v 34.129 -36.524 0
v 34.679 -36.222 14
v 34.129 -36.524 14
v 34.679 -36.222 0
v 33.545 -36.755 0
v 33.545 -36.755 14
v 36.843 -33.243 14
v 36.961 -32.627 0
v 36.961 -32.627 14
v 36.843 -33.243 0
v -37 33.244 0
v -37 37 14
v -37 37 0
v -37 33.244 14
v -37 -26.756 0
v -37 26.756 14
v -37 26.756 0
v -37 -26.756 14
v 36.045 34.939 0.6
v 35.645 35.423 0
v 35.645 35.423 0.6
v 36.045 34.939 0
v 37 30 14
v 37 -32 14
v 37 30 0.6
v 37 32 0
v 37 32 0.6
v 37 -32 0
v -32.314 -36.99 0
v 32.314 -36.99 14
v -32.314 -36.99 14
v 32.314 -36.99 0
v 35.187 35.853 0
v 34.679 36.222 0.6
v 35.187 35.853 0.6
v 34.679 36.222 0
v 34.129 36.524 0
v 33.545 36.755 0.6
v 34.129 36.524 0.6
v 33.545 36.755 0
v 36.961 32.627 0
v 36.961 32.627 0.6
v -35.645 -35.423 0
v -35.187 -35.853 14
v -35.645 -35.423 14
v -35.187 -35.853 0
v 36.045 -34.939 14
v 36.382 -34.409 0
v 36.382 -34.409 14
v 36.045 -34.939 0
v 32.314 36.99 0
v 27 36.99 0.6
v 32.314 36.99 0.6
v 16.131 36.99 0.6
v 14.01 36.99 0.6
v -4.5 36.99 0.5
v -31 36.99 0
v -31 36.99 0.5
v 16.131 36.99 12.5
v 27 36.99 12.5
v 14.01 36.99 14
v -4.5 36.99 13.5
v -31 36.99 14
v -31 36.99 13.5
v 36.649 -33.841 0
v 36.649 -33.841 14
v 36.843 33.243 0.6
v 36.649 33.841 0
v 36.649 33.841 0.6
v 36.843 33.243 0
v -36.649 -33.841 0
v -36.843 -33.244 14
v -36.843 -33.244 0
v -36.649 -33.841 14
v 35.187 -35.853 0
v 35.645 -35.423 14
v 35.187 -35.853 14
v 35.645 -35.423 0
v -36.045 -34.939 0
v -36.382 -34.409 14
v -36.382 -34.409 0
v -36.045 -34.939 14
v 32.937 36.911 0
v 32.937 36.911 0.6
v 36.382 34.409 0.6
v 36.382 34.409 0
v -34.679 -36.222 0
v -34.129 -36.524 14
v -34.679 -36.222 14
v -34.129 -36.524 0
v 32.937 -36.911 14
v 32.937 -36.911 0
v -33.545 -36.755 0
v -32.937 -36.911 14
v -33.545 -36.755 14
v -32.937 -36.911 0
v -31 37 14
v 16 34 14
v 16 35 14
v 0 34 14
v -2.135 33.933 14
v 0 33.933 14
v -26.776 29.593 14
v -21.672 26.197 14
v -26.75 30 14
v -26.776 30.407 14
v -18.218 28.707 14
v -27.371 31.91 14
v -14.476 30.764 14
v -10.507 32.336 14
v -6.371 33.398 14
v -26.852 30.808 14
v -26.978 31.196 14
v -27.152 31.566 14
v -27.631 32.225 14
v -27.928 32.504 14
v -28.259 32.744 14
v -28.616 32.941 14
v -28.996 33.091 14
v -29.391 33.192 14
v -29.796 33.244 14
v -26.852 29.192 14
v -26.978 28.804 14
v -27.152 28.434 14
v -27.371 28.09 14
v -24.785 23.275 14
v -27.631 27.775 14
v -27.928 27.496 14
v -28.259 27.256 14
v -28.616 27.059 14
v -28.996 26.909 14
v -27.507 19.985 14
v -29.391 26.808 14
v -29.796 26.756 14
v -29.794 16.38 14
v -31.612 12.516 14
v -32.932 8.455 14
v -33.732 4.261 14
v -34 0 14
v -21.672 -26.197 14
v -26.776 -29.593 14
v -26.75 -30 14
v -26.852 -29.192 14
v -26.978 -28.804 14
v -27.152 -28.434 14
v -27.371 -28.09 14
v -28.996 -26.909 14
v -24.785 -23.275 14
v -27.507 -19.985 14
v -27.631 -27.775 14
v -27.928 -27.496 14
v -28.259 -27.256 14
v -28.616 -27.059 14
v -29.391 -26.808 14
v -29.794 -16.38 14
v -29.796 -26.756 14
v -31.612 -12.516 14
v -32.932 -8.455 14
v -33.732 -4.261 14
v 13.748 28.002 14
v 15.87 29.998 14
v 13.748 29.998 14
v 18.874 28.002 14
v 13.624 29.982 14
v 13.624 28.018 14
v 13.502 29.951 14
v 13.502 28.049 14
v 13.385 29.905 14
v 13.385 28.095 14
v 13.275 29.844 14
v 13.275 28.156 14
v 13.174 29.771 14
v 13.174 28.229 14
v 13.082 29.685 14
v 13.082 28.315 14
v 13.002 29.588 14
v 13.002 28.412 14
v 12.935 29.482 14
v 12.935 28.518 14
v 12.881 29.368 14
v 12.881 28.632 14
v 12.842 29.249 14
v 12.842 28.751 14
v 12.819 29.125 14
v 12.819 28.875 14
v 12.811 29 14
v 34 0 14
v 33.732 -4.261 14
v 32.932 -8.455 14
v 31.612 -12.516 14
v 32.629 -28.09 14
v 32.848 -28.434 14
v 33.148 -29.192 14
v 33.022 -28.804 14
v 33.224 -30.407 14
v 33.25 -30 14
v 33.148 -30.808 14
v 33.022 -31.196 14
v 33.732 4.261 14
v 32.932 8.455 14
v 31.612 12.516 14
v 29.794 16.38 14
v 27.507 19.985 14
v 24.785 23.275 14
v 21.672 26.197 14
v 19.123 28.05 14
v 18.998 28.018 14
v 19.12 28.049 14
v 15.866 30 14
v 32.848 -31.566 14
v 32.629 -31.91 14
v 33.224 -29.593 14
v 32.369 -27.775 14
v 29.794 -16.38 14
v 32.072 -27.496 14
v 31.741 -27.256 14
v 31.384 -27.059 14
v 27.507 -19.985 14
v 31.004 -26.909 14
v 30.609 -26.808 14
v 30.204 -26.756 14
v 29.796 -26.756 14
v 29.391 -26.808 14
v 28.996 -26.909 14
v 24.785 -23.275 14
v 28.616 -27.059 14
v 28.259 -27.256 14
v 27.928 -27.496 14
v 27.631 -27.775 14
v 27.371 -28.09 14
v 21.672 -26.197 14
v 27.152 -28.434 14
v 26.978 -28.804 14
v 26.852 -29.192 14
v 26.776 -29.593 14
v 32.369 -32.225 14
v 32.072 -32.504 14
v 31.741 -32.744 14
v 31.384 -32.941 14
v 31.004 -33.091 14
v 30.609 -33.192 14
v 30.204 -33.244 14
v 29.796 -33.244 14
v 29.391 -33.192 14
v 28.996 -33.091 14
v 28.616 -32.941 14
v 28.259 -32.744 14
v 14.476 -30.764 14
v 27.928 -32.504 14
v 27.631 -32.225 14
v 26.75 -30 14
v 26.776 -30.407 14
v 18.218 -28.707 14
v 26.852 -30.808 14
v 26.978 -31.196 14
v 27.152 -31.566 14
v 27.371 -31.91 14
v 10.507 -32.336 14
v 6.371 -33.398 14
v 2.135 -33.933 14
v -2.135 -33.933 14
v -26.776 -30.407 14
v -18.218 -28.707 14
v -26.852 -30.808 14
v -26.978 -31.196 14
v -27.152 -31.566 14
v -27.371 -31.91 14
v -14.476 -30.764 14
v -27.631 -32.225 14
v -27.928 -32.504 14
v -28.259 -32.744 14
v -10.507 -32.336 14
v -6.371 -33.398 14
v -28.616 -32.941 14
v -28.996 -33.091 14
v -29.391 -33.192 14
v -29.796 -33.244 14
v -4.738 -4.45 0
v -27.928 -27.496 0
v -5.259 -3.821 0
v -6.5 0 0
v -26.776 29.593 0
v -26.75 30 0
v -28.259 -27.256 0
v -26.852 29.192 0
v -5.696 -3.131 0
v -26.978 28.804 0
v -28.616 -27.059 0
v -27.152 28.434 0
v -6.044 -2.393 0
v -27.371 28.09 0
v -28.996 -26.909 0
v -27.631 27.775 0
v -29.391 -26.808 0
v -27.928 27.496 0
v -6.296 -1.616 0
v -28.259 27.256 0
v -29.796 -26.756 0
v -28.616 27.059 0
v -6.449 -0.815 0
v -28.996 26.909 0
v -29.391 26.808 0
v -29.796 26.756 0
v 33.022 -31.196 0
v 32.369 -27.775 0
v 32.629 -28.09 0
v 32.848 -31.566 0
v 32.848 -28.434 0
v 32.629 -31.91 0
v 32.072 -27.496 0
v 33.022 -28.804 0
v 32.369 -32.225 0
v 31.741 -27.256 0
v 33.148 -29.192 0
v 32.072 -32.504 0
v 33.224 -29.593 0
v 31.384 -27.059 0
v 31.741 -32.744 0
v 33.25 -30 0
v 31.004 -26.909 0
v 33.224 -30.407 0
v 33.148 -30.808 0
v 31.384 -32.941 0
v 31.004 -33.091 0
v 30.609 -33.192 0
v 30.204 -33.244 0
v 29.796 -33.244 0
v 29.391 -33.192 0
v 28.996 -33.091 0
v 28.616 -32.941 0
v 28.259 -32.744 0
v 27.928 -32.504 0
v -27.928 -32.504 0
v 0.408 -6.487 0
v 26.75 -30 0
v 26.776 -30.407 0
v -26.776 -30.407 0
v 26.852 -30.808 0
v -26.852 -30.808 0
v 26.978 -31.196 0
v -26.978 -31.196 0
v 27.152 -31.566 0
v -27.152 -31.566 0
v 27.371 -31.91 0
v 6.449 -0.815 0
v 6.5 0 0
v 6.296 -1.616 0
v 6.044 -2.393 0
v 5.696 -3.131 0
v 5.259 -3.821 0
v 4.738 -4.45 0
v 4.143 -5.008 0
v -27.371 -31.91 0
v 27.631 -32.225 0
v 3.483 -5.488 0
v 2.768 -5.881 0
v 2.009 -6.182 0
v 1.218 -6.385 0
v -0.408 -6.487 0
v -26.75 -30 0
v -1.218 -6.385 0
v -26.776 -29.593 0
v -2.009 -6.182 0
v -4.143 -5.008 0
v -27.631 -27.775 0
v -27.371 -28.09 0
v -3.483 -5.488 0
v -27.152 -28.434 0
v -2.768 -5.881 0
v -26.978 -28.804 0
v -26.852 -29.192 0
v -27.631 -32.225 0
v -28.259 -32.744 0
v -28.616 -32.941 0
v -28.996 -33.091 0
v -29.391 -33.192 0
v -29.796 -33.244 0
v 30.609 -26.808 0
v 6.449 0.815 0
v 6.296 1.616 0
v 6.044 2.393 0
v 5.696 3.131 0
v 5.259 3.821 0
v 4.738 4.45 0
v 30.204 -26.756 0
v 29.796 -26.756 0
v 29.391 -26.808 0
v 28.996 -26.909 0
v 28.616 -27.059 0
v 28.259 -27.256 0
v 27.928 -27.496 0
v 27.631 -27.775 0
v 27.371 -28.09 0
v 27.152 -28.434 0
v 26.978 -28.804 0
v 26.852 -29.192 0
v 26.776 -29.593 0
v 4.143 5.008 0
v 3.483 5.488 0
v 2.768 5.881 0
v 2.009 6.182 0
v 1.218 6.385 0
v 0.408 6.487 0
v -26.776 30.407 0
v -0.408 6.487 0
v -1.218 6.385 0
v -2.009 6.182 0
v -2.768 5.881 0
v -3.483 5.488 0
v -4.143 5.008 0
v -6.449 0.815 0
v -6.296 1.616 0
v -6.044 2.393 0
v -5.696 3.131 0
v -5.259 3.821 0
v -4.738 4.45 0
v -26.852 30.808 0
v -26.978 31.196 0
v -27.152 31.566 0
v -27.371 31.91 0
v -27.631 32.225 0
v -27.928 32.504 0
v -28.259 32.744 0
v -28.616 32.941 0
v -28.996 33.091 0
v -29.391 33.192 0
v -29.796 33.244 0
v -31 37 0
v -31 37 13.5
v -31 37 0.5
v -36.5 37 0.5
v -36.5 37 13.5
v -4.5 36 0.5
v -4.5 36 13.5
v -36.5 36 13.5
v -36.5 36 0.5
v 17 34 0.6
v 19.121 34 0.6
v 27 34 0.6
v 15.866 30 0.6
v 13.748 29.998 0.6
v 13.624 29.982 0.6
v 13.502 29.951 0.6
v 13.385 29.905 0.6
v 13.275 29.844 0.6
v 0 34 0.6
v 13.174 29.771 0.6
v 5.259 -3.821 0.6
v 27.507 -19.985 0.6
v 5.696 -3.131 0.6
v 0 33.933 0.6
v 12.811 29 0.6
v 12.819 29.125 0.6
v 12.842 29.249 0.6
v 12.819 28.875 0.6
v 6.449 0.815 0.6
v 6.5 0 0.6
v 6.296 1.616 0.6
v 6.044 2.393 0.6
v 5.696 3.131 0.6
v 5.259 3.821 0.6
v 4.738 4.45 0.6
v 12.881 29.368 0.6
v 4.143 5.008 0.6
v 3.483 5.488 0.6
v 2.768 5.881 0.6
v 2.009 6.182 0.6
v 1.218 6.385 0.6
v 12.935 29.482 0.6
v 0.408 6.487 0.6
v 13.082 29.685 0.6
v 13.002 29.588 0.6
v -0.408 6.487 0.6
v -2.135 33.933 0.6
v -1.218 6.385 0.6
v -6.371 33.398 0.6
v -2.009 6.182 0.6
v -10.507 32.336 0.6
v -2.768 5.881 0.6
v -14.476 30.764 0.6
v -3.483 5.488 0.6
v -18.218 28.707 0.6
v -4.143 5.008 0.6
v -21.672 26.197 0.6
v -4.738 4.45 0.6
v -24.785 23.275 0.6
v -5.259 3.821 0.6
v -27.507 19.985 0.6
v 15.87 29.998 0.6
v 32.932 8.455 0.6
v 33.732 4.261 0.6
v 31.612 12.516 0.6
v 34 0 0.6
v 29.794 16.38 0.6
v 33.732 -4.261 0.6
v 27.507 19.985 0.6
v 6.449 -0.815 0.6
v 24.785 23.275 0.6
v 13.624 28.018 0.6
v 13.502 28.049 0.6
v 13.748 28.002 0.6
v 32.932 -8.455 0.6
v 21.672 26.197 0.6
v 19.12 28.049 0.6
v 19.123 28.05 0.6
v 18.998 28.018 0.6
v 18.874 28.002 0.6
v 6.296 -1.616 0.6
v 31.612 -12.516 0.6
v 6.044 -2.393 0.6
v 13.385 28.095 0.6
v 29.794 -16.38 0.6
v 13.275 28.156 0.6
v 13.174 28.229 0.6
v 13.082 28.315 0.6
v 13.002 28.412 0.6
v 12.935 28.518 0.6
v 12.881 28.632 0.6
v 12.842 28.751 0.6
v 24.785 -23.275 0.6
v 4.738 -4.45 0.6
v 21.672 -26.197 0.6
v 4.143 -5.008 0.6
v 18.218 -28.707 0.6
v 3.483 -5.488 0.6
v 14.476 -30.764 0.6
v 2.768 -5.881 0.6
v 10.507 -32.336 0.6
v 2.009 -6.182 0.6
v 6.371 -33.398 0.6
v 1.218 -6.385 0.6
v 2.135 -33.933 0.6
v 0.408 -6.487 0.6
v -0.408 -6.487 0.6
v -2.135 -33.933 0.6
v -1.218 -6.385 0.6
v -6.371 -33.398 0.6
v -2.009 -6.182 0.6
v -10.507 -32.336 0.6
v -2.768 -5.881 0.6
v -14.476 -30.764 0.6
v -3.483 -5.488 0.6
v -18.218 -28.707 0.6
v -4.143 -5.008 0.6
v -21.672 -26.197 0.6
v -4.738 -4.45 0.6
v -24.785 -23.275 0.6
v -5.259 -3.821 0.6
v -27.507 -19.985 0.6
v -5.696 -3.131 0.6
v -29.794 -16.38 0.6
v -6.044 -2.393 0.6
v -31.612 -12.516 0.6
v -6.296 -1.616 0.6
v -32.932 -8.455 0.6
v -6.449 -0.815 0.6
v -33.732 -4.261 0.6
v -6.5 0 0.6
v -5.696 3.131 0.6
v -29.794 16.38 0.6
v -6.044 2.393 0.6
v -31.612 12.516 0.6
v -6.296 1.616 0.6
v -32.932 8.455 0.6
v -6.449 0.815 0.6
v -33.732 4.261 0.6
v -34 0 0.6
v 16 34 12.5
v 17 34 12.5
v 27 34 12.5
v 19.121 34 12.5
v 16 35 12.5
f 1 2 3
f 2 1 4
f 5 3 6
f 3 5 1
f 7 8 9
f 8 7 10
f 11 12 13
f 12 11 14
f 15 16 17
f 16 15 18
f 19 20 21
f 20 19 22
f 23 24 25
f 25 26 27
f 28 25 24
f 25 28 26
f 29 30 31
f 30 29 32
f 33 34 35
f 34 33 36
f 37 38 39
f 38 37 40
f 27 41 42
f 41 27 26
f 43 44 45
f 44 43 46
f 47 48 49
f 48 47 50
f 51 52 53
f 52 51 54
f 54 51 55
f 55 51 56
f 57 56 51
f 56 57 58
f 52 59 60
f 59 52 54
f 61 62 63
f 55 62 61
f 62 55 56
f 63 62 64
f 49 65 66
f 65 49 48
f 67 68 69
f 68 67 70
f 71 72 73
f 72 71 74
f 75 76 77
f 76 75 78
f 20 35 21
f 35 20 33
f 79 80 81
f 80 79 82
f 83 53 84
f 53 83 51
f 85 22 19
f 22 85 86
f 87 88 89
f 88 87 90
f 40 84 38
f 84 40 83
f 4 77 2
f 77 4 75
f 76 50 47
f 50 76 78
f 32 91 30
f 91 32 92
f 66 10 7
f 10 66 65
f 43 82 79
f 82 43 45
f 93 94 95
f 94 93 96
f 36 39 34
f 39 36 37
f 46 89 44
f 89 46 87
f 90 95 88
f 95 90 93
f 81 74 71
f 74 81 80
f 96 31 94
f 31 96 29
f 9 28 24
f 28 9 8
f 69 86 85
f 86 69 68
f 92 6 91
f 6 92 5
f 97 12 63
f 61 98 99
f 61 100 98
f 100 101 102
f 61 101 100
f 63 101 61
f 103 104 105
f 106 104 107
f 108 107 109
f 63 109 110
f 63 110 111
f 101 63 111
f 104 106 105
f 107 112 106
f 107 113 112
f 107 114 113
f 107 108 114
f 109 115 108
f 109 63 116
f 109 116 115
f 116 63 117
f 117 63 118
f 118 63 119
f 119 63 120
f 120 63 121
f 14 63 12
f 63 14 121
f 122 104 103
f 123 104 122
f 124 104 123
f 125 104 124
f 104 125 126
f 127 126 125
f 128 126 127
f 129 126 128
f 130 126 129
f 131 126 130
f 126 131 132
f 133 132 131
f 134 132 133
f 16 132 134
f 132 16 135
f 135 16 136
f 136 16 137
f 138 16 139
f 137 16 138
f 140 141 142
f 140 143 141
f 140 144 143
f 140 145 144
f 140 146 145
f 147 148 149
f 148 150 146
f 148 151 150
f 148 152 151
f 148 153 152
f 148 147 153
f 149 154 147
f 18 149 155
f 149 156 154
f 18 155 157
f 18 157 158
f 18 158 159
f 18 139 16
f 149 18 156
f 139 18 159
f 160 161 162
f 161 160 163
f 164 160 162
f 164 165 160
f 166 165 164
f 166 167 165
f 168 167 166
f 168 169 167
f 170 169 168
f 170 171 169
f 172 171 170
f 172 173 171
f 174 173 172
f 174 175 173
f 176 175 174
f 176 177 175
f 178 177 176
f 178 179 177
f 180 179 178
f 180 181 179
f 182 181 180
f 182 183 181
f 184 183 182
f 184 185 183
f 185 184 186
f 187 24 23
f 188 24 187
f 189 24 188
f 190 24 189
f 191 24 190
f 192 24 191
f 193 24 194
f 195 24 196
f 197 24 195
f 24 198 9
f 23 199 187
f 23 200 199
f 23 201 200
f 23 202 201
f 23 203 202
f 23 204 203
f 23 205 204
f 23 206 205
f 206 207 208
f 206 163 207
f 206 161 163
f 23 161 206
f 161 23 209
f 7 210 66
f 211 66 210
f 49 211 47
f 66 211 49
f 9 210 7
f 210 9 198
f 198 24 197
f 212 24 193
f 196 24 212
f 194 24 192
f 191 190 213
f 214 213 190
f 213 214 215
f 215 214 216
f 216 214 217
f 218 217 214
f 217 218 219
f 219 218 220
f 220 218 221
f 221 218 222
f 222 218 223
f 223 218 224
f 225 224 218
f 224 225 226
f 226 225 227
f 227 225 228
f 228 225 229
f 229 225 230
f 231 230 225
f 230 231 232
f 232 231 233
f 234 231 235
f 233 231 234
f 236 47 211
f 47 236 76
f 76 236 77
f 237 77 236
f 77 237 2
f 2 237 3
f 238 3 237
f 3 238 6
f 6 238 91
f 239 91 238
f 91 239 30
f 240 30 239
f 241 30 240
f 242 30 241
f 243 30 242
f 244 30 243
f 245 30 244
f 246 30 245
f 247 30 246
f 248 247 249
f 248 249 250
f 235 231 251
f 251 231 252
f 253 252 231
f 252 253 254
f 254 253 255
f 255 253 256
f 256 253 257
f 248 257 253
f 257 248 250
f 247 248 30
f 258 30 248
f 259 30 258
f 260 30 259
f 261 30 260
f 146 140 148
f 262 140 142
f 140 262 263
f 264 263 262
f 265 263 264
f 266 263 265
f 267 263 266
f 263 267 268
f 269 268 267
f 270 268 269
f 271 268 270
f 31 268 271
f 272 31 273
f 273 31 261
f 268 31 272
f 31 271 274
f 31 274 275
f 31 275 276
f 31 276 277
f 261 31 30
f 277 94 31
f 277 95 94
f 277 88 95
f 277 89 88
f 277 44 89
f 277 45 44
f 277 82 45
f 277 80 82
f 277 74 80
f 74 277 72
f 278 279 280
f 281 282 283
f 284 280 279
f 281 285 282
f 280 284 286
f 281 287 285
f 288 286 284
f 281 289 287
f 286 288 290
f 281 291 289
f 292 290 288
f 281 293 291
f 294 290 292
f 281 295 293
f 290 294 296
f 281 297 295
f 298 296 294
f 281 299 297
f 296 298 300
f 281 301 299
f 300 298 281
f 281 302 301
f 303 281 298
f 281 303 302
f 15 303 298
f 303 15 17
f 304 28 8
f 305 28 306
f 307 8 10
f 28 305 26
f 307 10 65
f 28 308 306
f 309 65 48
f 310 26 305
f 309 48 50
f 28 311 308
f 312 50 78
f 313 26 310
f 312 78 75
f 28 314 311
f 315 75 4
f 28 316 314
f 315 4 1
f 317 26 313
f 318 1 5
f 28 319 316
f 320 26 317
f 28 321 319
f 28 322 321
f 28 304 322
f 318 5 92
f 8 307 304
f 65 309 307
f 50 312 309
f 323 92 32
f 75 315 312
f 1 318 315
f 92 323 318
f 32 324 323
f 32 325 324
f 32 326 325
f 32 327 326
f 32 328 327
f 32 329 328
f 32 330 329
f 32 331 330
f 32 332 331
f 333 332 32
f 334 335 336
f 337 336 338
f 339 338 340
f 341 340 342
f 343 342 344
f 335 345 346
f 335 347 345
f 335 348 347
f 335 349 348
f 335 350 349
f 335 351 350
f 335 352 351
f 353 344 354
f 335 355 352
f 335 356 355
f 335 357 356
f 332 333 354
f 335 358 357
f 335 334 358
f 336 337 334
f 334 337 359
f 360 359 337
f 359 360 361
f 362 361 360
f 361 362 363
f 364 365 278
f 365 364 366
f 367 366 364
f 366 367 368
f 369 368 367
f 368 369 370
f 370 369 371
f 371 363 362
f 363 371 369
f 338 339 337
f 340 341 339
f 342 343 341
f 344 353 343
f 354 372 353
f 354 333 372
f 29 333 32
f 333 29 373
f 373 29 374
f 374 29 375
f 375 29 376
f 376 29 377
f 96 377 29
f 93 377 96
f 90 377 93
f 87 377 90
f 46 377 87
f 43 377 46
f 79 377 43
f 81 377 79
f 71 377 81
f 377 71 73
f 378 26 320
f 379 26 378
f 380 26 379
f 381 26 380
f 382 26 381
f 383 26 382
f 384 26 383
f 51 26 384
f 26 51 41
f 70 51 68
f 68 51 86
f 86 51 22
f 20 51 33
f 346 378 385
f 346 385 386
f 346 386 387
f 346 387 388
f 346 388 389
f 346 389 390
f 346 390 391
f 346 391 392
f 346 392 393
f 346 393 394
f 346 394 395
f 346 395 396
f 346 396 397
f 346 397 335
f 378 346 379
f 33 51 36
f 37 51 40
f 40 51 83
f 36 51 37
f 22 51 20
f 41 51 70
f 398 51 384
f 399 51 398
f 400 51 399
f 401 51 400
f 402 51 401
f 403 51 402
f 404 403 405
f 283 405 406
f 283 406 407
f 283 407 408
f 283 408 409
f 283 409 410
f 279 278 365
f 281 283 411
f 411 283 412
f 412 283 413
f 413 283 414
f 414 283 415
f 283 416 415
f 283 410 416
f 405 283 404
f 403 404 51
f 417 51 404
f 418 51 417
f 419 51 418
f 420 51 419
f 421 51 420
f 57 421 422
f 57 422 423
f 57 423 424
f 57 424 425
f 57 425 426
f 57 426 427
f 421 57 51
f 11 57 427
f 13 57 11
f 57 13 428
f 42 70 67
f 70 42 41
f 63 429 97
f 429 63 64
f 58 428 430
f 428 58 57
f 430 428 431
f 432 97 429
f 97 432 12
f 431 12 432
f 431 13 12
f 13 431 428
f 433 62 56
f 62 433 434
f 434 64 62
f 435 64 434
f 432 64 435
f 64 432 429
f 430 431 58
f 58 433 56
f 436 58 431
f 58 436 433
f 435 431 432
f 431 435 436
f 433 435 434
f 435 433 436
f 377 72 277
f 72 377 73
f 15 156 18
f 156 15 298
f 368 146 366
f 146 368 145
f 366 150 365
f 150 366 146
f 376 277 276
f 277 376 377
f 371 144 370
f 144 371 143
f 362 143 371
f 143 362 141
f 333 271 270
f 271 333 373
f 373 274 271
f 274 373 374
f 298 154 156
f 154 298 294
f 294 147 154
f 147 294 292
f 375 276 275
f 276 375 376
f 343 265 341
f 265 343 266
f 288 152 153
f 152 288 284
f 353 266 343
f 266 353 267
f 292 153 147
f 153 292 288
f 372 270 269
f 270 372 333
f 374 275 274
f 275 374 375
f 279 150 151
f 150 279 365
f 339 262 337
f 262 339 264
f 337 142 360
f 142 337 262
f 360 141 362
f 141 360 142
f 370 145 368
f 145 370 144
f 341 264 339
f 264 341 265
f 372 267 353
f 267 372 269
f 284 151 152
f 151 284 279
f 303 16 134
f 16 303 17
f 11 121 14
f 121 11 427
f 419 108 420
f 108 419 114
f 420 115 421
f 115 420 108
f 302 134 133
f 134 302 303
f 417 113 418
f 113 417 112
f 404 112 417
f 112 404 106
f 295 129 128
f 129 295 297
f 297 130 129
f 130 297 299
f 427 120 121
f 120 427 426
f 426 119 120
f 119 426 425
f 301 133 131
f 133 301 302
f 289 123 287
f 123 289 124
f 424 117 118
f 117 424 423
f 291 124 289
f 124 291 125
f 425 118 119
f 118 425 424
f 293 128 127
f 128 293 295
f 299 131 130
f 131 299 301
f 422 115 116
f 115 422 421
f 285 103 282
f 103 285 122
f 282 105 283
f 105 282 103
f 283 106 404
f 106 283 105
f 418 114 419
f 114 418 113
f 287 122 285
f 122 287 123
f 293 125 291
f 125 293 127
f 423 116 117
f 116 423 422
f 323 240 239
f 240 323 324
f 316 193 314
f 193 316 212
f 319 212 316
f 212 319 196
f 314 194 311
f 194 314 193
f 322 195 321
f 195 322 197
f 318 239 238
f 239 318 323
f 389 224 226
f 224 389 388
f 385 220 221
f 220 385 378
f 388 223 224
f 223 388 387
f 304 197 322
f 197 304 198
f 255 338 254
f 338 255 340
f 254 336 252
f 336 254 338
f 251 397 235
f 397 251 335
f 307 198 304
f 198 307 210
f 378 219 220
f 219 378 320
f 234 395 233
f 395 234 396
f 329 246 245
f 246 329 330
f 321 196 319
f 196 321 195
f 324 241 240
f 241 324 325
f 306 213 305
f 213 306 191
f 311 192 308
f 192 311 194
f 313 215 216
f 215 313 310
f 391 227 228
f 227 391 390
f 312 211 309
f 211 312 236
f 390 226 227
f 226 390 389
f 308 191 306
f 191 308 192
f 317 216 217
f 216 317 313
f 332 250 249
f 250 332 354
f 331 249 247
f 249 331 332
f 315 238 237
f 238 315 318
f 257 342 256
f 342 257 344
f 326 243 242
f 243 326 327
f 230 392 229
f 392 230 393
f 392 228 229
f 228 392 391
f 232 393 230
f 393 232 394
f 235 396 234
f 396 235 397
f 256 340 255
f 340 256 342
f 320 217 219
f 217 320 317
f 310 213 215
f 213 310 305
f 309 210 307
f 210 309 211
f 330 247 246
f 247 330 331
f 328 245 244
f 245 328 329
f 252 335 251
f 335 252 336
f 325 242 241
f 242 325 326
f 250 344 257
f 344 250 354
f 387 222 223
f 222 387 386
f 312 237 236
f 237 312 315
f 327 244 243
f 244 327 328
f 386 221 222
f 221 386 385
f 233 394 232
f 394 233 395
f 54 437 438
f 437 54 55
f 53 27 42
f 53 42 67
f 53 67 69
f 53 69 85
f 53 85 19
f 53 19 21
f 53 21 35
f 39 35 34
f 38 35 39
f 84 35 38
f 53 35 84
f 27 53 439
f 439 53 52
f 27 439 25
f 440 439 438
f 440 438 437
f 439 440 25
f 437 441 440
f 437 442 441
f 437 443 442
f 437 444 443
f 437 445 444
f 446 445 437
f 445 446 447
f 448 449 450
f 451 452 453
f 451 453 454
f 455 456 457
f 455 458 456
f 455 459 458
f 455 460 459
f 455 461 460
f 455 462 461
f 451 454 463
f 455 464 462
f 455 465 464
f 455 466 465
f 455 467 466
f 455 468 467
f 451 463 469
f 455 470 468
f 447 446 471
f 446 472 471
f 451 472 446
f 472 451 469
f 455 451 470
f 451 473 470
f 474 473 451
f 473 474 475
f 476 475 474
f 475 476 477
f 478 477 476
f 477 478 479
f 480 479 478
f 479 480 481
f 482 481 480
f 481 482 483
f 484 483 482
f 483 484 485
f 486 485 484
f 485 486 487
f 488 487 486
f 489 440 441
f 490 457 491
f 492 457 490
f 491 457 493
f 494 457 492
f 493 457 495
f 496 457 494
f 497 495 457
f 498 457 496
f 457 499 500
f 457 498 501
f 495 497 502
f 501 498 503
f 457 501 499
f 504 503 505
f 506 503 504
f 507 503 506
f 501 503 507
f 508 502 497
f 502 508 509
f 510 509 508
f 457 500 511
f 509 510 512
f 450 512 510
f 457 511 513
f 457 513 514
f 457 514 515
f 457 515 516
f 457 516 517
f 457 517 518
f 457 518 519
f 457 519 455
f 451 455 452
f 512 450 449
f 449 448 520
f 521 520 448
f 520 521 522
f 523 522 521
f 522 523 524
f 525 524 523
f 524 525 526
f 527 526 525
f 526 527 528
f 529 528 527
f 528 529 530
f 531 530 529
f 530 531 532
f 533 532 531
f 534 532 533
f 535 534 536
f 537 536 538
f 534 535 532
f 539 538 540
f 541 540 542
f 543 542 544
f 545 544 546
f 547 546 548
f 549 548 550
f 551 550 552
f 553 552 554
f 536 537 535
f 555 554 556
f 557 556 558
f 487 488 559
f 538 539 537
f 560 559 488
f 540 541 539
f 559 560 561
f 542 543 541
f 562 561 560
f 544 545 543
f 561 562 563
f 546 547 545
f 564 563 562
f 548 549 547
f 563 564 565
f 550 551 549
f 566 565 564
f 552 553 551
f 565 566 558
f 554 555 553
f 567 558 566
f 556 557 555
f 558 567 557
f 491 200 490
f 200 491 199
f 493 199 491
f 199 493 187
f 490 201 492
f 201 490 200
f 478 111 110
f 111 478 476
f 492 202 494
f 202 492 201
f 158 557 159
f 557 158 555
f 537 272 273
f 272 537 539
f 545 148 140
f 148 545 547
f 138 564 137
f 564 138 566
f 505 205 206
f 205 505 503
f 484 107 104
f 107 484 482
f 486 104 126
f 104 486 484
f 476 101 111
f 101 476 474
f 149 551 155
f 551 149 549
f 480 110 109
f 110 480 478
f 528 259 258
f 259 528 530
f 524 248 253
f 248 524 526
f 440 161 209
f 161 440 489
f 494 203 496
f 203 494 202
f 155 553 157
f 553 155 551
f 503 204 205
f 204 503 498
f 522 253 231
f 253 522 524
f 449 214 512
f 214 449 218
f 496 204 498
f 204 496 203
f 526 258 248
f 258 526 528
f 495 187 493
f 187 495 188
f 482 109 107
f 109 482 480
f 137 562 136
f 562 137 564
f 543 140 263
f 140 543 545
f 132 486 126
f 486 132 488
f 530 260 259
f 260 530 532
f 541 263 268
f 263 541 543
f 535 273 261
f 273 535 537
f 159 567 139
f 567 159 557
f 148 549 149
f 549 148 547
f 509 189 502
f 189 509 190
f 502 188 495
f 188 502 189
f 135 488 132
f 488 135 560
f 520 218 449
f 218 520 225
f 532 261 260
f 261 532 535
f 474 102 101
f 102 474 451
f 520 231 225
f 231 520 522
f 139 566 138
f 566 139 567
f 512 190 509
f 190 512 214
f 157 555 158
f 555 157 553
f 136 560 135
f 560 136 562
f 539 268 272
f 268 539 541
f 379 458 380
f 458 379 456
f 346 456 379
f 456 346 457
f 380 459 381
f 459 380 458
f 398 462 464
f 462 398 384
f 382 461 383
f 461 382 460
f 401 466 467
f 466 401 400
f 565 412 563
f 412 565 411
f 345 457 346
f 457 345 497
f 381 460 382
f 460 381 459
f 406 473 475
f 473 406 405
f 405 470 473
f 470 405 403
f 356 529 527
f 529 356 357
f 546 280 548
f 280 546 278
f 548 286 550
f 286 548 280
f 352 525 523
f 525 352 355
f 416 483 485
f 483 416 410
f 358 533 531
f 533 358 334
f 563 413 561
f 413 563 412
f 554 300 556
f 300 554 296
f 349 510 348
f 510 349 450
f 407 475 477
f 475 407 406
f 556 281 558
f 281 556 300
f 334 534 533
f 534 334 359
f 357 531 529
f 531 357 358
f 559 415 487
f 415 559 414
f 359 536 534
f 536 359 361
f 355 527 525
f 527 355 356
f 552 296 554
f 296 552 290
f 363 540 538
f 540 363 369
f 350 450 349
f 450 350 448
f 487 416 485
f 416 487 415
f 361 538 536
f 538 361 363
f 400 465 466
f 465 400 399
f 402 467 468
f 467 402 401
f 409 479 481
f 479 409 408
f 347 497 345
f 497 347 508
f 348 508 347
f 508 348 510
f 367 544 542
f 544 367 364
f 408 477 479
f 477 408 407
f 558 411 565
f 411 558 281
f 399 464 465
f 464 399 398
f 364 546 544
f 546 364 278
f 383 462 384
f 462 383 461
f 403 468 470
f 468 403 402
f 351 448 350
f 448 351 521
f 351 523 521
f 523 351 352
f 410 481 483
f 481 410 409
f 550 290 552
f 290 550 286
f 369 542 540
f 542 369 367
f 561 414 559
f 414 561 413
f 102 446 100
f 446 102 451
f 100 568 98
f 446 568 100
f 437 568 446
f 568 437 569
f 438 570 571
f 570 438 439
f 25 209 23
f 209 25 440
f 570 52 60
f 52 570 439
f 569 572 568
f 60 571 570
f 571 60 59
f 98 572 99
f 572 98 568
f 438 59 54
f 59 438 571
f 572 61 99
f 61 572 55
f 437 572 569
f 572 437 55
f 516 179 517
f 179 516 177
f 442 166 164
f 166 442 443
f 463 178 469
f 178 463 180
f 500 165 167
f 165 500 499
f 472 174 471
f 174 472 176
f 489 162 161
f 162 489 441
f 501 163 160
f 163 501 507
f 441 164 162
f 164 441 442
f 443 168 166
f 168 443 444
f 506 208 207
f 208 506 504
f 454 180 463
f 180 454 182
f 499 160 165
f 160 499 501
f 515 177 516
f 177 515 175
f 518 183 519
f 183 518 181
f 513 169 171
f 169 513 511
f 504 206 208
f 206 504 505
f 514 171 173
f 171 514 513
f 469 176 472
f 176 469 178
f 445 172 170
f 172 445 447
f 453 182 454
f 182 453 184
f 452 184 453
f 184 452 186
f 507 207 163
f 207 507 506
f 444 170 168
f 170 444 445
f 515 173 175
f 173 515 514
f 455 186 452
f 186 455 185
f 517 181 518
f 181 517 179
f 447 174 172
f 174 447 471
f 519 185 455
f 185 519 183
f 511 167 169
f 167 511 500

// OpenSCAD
$fn = 50;


union() {
	difference() {
		union() {
			translate(v = [0, 0, 0]) {
				rotate(a = [0, 0, 0]) {
					hull() {
						translate(v = [-32.0000000000, 32.0000000000, 0]) {
							rotate(a = [0, 0, 0]) {
								translate(v = [0, 0, 0]) {
									rotate(a = [0, 0, 0]) {
										cylinder(h = 14, r = 5);
									}
								}
							}
						}
						translate(v = [32.0000000000, 32.0000000000, 0]) {
							rotate(a = [0, 0, 0]) {
								translate(v = [0, 0, 0]) {
									rotate(a = [0, 0, 0]) {
										cylinder(h = 14, r = 5);
									}
								}
							}
						}
						translate(v = [-32.0000000000, -32.0000000000, 0]) {
							rotate(a = [0, 0, 0]) {
								translate(v = [0, 0, 0]) {
									rotate(a = [0, 0, 0]) {
										cylinder(h = 14, r = 5);
									}
								}
							}
						}
						translate(v = [32.0000000000, -32.0000000000, 0]) {
							rotate(a = [0, 0, 0]) {
								translate(v = [0, 0, 0]) {
									rotate(a = [0, 0, 0]) {
										cylinder(h = 14, r = 5);
									}
								}
							}
						}
					}
				}
			}
			translate(v = [-37.0000000000, 31.0000000000, 0]) {
				rotate(a = [0, 0, 0]) {
					cube(size = [6, 6, 14]);
				}
			}
		}
		union() {
			#translate(v = [-36.5000000000, 36.0000000000, 0.5000000000]) {
				rotate(a = [0, 0, 0]) {
					cube(size = [32, 1, 13.0000000000]);
				}
			}
			translate(v = [-37.5000000000, -30.0000000000, -125]) {
				rotate(a = [0, 0, 0]) {
					hull() {
						translate(v = [7.5000000000, 0, 0]) {
							rotate(a = [0, 0, 0]) {
								translate(v = [0, 0, 0]) {
									rotate(a = [0, 0, 0]) {
										cylinder(h = 250, r = 3.2500000000);
									}
								}
							}
						}
						translate(v = [-7.5000000000, 0, 0]) {
							rotate(a = [0, 0, 0]) {
								translate(v = [0, 0, 0]) {
									rotate(a = [0, 0, 0]) {
										cylinder(h = 250, r = 3.2500000000);
									}
								}
							}
						}
					}
				}
			}
			translate(v = [-37.5000000000, 30.0000000000, -125]) {
				rotate(a = [0, 0, 0]) {
					hull() {
						translate(v = [7.5000000000, 0, 0]) {
							rotate(a = [0, 0, 0]) {
								translate(v = [0, 0, 0]) {
									rotate(a = [0, 0, 0]) {
										cylinder(h = 250, r = 3.2500000000);
									}
								}
							}
						}
						translate(v = [-7.5000000000, 0, 0]) {
							rotate(a = [0, 0, 0]) {
								translate(v = [0, 0, 0]) {
									rotate(a = [0, 0, 0]) {
										cylinder(h = 250, r = 3.2500000000);
									}
								}
							}
						}
					}
				}
			}
			translate(v = [30.0000000000, -30.0000000000, -125.0000000000]) {
				rotate(a = [0, 0, 0]) {
					cylinder(h = 250, r = 3.2500000000);
				}
			}
			translate(v = [0, 0, 0.6000000000]) {
				rotate(a = [0, 0, 0]) {
					cylinder(h = 16.4000000000, r = 34.0000000000);
				}
			}
			translate(v = [0, 0, -7.0000000000]) {
				rotate(a = [0, 0, 0]) {
					cylinder(h = 14, r = 6.5000000000);
				}
			}
			translate(v = [0.0000000000, 30.0000000000, 0.6000000000]) {
				rotate(a = [0, 0, 0]) {
					cube(size = [37.0000000000, 4, 16.4000000000]);
				}
			}
			translate(v = [27.0000000000, 30.0000000000, 0.6000000000]) {
				rotate(a = [0, 0, 0]) {
					cube(size = [10, 7, 16.4000000000]);
				}
			}
			translate(v = [16.0000000000, 30.0000000000, 12.5000000000]) {
				rotate(a = [0, 0, 0]) {
					cube(size = [21, 7, 1.5000000000]);
				}
			}
			translate(v = [13.2500000000, 37.7500000000, 0.6000000000]) {
				rotate(a = [0, 0, -45]) {
					cube(size = [7.5000000000, 1.5000000000, 16.4000000000]);
				}
			}
			translate(v = [7.0610000000, 28.0000000000, 0.6000000000]) {
				rotate(a = [0, 0, 0]) {
					cube(size = [7.5000000000, 2, 13.4000000000]);
				}
			}
		}
	}
	union() {
		translate(v = [16.3110000000, 29.0000000000, 0]) {
			rotate(a = [0, 0, 0]) {
				hull() {
					translate(v = [2.5000000000, 0, 0]) {
						rotate(a = [0, 0, 0]) {
							#translate(v = [0, 0, 0]) {
								rotate(a = [0, 0, 0]) {
									cylinder(h = 14, r = 1.0000000000);
								}
							}
						}
					}
					translate(v = [-2.5000000000, 0, 0]) {
						rotate(a = [0, 0, 0]) {
							#translate(v = [0, 0, 0]) {
								rotate(a = [0, 0, 0]) {
									cylinder(h = 14, r = 1.0000000000);
								}
							}
						}
					}
				}
			}
		}
	}
}
